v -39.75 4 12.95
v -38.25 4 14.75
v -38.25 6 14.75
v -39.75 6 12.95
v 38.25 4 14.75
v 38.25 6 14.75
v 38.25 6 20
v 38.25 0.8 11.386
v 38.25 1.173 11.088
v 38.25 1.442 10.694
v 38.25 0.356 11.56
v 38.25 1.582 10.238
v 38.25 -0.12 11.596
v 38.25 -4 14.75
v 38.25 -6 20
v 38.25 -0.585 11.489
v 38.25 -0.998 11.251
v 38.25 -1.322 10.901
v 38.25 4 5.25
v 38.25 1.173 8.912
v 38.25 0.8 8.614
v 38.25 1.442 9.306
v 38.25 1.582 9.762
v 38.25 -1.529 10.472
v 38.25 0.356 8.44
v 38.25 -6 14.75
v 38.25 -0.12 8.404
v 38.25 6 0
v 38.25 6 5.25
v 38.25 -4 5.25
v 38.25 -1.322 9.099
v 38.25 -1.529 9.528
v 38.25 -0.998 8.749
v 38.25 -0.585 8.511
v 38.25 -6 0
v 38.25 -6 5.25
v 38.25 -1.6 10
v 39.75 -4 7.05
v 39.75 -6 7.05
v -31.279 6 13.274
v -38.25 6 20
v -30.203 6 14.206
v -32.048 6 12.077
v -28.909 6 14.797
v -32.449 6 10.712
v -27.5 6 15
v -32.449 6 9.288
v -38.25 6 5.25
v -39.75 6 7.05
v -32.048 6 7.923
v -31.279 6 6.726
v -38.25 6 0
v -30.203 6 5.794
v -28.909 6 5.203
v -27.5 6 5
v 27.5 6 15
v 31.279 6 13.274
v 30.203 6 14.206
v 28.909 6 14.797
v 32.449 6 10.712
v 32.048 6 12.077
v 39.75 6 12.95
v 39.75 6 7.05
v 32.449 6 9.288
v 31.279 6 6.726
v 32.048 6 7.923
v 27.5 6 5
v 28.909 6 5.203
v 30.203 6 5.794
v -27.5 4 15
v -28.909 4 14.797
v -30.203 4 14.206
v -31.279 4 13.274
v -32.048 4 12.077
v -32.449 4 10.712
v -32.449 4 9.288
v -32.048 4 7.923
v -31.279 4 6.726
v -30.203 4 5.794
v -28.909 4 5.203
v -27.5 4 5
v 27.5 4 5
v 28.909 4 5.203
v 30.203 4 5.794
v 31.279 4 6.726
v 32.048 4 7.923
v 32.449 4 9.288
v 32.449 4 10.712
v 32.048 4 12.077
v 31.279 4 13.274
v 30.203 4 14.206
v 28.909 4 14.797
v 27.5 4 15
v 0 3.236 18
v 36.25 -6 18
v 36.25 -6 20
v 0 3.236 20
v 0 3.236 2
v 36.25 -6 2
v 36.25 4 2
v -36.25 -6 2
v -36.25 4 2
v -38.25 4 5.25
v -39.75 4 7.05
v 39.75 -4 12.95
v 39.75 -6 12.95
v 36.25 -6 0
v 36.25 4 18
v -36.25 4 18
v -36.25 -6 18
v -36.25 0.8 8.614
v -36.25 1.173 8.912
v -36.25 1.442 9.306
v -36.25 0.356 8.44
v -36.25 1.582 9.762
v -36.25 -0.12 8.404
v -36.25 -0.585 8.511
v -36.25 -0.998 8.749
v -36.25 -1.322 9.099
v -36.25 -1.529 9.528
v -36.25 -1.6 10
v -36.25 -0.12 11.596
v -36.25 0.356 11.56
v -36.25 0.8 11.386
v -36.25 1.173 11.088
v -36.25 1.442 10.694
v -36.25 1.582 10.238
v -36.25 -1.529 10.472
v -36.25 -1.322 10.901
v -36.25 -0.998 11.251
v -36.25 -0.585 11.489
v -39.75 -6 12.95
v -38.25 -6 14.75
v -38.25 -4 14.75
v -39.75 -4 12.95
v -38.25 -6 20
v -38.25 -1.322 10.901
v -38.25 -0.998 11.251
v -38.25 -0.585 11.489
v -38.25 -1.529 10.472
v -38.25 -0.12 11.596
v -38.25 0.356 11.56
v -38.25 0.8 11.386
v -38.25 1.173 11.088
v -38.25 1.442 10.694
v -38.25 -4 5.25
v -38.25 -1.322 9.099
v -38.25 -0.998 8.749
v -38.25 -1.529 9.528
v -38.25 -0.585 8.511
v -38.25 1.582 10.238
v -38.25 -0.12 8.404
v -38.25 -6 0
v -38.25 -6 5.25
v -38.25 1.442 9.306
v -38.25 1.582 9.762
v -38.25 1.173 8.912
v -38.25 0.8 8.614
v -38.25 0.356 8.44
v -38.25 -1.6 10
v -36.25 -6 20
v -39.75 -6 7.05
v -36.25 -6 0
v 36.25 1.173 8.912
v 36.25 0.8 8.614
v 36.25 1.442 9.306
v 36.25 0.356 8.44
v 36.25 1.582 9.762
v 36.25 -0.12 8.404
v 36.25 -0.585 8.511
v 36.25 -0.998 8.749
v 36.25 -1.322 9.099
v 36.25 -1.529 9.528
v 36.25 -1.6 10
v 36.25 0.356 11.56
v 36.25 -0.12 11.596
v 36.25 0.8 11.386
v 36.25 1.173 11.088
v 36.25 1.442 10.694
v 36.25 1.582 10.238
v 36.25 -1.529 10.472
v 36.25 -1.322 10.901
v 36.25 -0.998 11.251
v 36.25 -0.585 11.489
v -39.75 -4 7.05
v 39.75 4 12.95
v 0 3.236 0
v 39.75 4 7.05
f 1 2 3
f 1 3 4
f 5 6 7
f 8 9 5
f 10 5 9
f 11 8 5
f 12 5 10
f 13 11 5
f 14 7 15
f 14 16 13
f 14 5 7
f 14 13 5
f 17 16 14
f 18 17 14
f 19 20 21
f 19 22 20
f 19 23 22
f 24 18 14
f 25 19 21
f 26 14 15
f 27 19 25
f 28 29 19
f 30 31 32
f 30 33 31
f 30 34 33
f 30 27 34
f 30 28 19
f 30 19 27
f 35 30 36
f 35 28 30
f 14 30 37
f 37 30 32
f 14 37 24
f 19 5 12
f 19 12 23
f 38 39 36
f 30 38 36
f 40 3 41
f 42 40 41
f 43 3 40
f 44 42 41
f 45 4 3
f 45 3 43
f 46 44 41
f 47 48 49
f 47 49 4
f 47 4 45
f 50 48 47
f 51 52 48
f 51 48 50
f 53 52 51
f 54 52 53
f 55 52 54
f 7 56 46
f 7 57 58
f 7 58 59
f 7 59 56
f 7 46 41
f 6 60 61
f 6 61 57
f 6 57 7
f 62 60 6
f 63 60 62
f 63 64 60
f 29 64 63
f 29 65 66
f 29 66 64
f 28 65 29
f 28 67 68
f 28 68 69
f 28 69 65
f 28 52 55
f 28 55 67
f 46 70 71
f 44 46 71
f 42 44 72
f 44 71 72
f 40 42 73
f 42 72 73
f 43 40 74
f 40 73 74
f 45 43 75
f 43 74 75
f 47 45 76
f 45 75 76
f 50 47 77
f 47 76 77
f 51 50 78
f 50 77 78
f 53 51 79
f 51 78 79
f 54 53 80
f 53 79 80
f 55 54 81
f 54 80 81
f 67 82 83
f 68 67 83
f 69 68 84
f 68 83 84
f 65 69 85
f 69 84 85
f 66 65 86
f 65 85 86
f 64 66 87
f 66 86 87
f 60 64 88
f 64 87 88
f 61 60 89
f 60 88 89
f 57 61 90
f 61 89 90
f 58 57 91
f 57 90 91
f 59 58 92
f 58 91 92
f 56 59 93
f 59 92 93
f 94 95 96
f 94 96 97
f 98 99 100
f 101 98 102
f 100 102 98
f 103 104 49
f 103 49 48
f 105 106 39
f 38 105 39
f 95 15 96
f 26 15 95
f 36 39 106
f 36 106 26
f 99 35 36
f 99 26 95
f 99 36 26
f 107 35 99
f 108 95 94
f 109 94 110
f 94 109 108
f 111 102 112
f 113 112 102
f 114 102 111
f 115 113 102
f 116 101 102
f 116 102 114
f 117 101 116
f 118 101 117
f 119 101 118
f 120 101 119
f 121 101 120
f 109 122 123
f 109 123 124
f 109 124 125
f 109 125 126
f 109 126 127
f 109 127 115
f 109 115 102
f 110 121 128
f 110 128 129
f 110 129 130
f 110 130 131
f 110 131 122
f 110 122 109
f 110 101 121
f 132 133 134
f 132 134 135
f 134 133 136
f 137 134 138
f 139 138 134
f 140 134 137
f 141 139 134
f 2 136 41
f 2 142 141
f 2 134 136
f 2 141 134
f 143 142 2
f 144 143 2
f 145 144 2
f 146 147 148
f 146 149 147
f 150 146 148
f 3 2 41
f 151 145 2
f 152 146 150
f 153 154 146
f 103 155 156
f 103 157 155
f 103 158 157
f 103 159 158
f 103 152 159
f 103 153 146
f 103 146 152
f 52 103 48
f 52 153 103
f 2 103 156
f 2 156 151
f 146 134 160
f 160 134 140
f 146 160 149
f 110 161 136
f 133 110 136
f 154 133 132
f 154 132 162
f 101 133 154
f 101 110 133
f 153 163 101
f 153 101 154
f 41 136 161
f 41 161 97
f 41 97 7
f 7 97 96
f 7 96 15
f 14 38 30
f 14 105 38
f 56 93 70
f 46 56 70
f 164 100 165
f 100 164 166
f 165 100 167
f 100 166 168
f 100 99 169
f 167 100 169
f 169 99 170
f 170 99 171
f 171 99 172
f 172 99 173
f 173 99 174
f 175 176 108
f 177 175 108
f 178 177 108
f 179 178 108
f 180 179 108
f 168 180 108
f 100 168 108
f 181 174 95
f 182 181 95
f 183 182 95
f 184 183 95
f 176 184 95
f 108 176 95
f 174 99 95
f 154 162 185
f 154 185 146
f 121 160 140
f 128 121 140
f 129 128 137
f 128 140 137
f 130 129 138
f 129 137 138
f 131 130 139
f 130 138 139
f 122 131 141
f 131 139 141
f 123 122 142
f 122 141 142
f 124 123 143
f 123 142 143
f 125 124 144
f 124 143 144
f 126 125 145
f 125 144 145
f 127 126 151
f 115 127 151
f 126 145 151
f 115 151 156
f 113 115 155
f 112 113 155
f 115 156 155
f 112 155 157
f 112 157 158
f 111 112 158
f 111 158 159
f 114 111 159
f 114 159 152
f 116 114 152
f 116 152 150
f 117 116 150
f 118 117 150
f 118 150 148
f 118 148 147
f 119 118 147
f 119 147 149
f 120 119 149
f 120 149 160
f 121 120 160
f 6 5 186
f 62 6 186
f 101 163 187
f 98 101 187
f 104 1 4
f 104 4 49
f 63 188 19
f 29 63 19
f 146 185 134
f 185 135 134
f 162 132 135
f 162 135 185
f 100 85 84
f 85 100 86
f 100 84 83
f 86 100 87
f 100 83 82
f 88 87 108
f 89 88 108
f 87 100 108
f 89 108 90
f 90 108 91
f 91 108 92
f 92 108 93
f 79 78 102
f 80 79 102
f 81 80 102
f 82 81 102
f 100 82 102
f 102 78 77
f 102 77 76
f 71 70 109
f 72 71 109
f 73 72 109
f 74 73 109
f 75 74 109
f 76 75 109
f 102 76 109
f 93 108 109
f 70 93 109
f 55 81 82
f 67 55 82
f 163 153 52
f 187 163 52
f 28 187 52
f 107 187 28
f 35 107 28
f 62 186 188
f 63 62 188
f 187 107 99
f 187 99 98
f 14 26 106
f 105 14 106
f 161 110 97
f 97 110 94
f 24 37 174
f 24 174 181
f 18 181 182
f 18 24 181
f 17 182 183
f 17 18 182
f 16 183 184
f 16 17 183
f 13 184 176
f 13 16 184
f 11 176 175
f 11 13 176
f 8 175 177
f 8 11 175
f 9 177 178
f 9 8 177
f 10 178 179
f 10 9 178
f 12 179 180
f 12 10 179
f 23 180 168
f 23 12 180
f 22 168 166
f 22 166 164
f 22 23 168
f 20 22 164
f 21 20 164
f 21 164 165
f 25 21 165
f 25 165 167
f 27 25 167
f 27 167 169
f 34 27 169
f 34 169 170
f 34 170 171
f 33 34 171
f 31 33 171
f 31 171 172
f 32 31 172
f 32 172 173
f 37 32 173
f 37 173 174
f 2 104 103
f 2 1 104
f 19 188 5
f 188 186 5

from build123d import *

# Parameters (mm, degrees)
PAD_DEPTH       = 20
PAD001_DEPTH    = 12
SKETCH002_R     = 1.6
POCKET_DEPTH    = 3.5
SKETCH003_W     = 8
SKETCH003_H     = 9.5
POCKET001_DEPTH = 1.5
PAD002_DEPTH    = 20
SKETCH005_W     = 39.25
SKETCH005_H     = 16
POCKET002_DEPTH = 10
POCKET003_DEPTH = 2


with BuildPart() as part:
    # Sketch → Pad (new body)
    with BuildSketch(Plane.XY):
        Polygon((-36.25, -6), (-38.25, -6), (-38.25, 6), (38.25, 6), (38.25, -6), (36.25, -6), (36.25, 4), (-36.25, 4), align=None)
    extrude(amount=PAD_DEPTH)

    # Sketch001 (on Face1 of Pad) → Pad001 (join)
    with BuildSketch(Plane.XZ.offset(6)):
        Polygon((-38.25, 5.25), (-38.25, 14.75), (-39.75, 12.95), (-39.75, 7.05), align=None)
    pad001 = extrude(amount=-PAD001_DEPTH)

    # Sketch002 (on Face12 of Pad001) → Pocket (cut)
    with BuildSketch(Plane(origin=(-39.75, 0, 0), x_dir=(0, -1, 0), z_dir=(-1, 0, 0))):
        with Locations((0, 10)):
            Circle(SKETCH002_R)
    pocket = extrude(amount=-POCKET_DEPTH, mode=Mode.SUBTRACT)

    # Sketch003 (on Face13 of Pocket) → Pocket001 (cut)
    with BuildSketch(Plane(origin=(-39.75, 0, 0), x_dir=(0, -1, 0), z_dir=(-1, 0, 0))):
        with Locations((0, 10)):
            Rectangle(SKETCH003_W, SKETCH003_H)
    pocket001 = extrude(amount=-POCKET001_DEPTH, mode=Mode.SUBTRACT)

    # Sketch004 (on Face6 of Pocket001) → Pad002 (join)
    with BuildSketch(Plane(origin=(0, 0, 0), x_dir=(1, 0, 0), z_dir=(0, 0, -1))):
        Polygon((-36.25, -4), (-36.25, 6), (3, -4), align=None)
    pad002 = extrude(amount=-PAD002_DEPTH)

    # Sketch005 (on Face1 of Pad002) → Pocket002 (cut)
    with BuildSketch(Plane.XZ.offset(6)):
        with Locations((-16.625, 10)):
            Rectangle(SKETCH005_W, SKETCH005_H)
    pocket002 = extrude(amount=-POCKET002_DEPTH, mode=Mode.SUBTRACT)

    # Mirrored: Pad001, Pocket, Pocket001, Pad002, Pocket002 across YZ
    add(pad001.mirror(Plane.YZ))
    add(pocket.mirror(Plane.YZ), mode=Mode.SUBTRACT)
    add(pocket001.mirror(Plane.YZ), mode=Mode.SUBTRACT)
    add(pad002.mirror(Plane.YZ))
    add(pocket002.mirror(Plane.YZ), mode=Mode.SUBTRACT)

    # Sketch006 (on Face12 of Mirrored) → Pocket003 (cut)
    with BuildSketch(Plane.XZ.offset(-4)):
        with BuildLine():
            ThreePointArc((-27.5, 15), (-32.5, 10), (-27.5, 5))
            Line((-27.5, 5), (27.5, 5))
            ThreePointArc((27.5, 5), (32.5, 10), (27.5, 15))
            Line((27.5, 15), (-27.5, 15))
        make_face()
    extrude(amount=-POCKET003_DEPTH, mode=Mode.SUBTRACT)


solid = part.part
